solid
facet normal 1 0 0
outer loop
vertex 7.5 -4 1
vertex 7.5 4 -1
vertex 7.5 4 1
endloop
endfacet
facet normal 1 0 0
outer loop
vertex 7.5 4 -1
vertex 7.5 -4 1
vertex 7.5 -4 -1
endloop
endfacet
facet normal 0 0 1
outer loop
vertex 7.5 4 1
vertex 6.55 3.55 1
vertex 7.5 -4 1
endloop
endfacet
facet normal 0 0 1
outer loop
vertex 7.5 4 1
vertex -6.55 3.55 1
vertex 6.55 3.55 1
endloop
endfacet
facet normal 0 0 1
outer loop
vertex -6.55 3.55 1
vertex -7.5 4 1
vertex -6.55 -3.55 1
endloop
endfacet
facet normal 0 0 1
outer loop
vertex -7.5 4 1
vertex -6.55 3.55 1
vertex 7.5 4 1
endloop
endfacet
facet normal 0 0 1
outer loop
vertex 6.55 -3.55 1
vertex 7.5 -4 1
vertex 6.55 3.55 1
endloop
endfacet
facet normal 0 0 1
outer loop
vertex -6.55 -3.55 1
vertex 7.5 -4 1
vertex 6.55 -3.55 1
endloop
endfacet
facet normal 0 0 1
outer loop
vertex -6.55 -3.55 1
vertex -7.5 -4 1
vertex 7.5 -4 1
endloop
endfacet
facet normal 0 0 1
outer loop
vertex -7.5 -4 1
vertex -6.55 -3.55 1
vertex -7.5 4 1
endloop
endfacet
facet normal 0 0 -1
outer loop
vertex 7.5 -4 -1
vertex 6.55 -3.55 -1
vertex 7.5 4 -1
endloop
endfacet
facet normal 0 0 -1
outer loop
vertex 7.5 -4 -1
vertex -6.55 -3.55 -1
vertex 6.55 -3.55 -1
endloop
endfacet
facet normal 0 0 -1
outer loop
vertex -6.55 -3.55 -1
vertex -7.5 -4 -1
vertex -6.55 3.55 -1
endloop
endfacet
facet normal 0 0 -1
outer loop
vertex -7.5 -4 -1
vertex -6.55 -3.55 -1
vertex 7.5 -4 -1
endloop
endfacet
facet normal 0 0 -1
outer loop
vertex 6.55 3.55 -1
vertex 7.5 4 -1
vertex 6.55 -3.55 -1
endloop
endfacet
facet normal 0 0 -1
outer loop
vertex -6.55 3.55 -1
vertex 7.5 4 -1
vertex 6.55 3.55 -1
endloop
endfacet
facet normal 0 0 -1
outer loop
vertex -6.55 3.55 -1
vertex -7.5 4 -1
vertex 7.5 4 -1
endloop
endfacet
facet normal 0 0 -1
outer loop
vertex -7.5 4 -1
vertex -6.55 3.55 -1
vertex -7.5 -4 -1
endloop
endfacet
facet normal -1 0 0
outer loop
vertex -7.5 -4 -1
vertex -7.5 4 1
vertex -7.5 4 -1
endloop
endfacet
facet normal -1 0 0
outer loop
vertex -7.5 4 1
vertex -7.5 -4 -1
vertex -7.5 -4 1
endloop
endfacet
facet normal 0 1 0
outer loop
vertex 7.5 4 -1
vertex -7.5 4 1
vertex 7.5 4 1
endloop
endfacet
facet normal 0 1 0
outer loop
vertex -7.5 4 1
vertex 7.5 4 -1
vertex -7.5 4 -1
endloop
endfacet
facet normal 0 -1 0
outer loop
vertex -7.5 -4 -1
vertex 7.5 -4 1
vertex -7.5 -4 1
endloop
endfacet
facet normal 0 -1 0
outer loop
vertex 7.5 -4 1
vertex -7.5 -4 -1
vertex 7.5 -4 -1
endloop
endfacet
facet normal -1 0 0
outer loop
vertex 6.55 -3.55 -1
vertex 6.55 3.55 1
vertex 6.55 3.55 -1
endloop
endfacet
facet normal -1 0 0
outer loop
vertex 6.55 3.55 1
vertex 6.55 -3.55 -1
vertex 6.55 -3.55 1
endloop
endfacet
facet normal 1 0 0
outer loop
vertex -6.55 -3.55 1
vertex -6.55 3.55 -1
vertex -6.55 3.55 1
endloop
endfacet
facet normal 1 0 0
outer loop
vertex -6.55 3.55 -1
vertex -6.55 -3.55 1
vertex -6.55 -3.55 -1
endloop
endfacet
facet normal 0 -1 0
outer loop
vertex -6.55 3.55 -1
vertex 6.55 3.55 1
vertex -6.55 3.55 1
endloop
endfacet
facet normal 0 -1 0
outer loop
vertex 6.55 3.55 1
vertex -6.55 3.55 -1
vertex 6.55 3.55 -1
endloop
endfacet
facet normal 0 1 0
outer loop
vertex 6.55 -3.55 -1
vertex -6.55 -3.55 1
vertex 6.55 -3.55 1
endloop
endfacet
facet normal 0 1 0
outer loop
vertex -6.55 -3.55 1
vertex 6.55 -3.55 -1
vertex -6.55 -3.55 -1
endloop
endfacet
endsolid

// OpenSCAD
$fa = 0.4;
$fs = 0.4;


difference() {
	cube(center = true, size = [15, 8, 2]);
	cube(center = true, size = [13.1000000000, 7.1000000000, 10]);
}
